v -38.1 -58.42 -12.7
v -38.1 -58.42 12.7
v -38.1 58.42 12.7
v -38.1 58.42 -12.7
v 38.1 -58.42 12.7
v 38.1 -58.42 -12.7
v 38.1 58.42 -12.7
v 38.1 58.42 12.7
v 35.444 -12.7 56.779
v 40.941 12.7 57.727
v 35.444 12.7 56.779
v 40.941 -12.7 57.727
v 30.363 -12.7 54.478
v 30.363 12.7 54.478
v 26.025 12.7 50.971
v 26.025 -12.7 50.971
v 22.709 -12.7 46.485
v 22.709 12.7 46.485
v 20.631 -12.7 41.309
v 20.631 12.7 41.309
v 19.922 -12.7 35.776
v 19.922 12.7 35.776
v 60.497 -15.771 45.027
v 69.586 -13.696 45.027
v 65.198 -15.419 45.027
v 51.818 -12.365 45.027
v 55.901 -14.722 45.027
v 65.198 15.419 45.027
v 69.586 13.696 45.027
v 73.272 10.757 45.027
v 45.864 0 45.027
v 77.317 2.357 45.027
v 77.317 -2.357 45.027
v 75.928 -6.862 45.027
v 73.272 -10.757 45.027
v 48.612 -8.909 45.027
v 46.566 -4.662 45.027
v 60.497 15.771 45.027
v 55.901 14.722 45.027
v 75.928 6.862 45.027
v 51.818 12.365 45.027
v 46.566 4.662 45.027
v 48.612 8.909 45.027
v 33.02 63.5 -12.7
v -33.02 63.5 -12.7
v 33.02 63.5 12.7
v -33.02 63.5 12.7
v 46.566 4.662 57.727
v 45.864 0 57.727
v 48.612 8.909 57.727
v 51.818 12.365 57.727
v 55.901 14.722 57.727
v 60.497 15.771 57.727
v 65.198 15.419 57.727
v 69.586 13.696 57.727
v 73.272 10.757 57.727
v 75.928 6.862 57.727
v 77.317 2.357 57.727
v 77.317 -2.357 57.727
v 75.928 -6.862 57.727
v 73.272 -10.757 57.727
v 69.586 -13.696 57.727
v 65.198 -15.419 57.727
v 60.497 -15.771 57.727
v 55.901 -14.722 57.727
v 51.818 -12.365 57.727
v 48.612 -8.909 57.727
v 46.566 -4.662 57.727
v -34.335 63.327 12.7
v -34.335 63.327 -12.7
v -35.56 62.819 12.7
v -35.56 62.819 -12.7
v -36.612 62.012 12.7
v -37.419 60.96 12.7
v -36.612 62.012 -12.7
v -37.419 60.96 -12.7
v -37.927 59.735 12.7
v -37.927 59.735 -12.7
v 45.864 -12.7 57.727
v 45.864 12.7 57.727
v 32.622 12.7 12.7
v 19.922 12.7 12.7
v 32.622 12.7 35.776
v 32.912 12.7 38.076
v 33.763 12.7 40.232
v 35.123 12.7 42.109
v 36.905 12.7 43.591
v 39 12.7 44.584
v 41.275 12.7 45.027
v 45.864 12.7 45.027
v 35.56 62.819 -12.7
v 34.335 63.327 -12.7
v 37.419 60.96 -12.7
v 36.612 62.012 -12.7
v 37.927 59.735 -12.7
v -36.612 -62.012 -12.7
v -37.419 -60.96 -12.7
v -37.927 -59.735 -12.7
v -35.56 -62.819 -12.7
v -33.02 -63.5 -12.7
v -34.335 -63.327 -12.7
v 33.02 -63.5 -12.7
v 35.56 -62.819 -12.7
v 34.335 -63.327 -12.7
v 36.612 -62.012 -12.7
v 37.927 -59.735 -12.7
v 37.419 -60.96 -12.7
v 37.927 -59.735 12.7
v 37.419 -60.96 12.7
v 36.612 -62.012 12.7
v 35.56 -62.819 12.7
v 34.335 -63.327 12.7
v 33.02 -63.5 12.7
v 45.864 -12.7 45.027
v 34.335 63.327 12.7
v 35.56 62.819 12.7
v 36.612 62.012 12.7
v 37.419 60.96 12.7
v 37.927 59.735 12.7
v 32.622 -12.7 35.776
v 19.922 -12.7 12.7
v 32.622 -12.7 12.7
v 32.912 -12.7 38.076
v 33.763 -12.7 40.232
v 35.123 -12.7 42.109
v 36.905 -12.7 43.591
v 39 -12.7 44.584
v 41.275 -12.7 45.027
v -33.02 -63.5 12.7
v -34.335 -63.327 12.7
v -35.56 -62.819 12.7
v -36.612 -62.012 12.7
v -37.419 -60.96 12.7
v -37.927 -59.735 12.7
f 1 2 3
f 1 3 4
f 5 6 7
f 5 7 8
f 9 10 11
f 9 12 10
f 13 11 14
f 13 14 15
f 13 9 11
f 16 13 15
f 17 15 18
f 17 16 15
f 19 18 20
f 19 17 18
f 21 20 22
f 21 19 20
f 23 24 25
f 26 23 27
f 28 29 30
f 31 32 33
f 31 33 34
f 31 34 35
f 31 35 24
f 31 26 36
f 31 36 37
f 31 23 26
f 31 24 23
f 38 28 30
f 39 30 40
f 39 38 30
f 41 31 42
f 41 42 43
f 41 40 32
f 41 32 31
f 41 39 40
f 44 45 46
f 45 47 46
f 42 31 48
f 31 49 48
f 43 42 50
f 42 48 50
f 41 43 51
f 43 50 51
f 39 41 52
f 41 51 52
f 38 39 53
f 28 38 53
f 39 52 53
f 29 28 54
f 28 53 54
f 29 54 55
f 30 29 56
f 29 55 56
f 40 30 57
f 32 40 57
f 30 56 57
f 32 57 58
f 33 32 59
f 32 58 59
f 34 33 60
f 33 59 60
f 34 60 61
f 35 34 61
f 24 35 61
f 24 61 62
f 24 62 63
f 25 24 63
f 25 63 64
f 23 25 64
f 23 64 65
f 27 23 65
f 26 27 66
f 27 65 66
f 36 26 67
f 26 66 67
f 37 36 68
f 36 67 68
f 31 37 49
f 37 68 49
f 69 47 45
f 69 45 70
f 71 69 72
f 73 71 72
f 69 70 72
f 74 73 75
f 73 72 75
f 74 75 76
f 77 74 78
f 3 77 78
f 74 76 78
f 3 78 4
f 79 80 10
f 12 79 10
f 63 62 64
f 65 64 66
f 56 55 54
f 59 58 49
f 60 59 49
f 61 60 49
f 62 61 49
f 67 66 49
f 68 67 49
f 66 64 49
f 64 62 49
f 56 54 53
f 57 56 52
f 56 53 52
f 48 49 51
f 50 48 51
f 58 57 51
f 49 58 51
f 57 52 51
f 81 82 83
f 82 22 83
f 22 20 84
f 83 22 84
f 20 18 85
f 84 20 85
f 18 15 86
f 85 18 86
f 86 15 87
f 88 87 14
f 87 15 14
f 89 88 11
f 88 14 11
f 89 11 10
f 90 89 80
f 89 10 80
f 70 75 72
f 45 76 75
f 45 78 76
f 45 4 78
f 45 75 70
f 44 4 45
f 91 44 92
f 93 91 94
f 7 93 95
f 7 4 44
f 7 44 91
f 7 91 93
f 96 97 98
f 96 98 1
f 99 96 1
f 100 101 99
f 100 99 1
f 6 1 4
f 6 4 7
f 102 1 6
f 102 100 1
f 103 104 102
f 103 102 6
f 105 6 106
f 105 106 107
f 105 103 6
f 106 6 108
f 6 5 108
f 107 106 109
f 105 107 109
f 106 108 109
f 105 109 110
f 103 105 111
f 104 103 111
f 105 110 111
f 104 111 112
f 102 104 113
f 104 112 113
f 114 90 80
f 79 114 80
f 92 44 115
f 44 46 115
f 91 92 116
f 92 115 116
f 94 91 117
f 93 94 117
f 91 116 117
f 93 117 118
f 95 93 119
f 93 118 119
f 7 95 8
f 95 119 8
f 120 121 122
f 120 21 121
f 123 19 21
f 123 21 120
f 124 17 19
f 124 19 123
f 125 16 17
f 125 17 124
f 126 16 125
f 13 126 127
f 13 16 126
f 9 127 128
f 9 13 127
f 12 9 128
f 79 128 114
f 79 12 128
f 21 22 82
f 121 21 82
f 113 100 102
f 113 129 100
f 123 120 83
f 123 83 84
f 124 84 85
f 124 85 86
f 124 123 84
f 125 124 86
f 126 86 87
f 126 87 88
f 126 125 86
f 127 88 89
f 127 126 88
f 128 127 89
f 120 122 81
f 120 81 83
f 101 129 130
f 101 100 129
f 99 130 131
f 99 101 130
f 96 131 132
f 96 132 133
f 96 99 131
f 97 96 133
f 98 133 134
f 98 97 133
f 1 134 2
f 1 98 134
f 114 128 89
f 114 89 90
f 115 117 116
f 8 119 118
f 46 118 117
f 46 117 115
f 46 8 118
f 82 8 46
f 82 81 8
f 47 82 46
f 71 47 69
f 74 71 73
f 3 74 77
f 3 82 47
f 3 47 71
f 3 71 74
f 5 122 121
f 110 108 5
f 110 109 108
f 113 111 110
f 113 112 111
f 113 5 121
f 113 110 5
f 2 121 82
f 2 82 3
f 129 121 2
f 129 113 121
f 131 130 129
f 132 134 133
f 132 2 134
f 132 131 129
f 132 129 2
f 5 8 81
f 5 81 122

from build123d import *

# Parameters (mm, degrees)
F1_DEPTH = 63.5
F2_DEPTH = 12.7
F0_W     = 15.8150978086
F0_H     = 12.7
F4_R     = 5.08


with BuildPart() as f1:
    # F0 (on Front) → F1 (new body, symmetric)
    with BuildSketch(Plane.XZ):
        Polygon((-38.1, -12.7), (38.1, -12.7), (38.1, 12.7), (32.6224114357, 12.7), (19.9224114357, 12.7), (-38.1, 12.7), align=None)
    extrude(amount=F1_DEPTH, both=True)

    # F0 (on Front) → F2 (join, symmetric)
    with BuildSketch(Plane.XZ):
        with BuildLine():
            Line((19.9224114357, 12.7), (32.6224114357, 12.7))
            Line((32.6224114357, 12.7), (32.6224114357, 35.7757893081))
            ThreePointArc((32.6224114357, 35.7757893081), (35.1228147899, 42.1092562003), (41.2753674716, 45.0266035067))
            Line((41.2753674716, 45.0266035067), (45.8637634207, 45.0266035067))
            Line((45.8637634207, 45.0266035067), (45.8637634207, 57.7266035067))
            Line((45.8637634207, 57.7266035067), (40.9414269352, 57.7266035067))
            ThreePointArc((40.9414269352, 57.7266035067), (26.0245349942, 50.971489823), (19.9224114357, 35.7757893081))
            Line((19.9224114357, 35.7757893081), (19.9224114357, 12.7))
        make_face()
    extrude(amount=F2_DEPTH, both=True)

    # F4
    f4_edges = [f1.edges().sort_by_distance(p)[0] for p in [
        (-38.1, -63.5, 0),
        (38.1, -63.5, 0),
        (-38.1, 63.5, 0),
        (38.1, 63.5, 0),
    ]]
    fillet(f4_edges, radius=F4_R)


with BuildPart() as f3:
    # F0 (on Front) → F3 (revolve)
    with BuildSketch(Plane.XZ):
        with Locations((53.771312325, 51.3766035067)):
            Rectangle(F0_W, F0_H)
    revolve(axis=Axis((61.6788612294, 0, 51.3766035067), (0, 0, -1)))


solid = Compound([f1.part, f3.part])
